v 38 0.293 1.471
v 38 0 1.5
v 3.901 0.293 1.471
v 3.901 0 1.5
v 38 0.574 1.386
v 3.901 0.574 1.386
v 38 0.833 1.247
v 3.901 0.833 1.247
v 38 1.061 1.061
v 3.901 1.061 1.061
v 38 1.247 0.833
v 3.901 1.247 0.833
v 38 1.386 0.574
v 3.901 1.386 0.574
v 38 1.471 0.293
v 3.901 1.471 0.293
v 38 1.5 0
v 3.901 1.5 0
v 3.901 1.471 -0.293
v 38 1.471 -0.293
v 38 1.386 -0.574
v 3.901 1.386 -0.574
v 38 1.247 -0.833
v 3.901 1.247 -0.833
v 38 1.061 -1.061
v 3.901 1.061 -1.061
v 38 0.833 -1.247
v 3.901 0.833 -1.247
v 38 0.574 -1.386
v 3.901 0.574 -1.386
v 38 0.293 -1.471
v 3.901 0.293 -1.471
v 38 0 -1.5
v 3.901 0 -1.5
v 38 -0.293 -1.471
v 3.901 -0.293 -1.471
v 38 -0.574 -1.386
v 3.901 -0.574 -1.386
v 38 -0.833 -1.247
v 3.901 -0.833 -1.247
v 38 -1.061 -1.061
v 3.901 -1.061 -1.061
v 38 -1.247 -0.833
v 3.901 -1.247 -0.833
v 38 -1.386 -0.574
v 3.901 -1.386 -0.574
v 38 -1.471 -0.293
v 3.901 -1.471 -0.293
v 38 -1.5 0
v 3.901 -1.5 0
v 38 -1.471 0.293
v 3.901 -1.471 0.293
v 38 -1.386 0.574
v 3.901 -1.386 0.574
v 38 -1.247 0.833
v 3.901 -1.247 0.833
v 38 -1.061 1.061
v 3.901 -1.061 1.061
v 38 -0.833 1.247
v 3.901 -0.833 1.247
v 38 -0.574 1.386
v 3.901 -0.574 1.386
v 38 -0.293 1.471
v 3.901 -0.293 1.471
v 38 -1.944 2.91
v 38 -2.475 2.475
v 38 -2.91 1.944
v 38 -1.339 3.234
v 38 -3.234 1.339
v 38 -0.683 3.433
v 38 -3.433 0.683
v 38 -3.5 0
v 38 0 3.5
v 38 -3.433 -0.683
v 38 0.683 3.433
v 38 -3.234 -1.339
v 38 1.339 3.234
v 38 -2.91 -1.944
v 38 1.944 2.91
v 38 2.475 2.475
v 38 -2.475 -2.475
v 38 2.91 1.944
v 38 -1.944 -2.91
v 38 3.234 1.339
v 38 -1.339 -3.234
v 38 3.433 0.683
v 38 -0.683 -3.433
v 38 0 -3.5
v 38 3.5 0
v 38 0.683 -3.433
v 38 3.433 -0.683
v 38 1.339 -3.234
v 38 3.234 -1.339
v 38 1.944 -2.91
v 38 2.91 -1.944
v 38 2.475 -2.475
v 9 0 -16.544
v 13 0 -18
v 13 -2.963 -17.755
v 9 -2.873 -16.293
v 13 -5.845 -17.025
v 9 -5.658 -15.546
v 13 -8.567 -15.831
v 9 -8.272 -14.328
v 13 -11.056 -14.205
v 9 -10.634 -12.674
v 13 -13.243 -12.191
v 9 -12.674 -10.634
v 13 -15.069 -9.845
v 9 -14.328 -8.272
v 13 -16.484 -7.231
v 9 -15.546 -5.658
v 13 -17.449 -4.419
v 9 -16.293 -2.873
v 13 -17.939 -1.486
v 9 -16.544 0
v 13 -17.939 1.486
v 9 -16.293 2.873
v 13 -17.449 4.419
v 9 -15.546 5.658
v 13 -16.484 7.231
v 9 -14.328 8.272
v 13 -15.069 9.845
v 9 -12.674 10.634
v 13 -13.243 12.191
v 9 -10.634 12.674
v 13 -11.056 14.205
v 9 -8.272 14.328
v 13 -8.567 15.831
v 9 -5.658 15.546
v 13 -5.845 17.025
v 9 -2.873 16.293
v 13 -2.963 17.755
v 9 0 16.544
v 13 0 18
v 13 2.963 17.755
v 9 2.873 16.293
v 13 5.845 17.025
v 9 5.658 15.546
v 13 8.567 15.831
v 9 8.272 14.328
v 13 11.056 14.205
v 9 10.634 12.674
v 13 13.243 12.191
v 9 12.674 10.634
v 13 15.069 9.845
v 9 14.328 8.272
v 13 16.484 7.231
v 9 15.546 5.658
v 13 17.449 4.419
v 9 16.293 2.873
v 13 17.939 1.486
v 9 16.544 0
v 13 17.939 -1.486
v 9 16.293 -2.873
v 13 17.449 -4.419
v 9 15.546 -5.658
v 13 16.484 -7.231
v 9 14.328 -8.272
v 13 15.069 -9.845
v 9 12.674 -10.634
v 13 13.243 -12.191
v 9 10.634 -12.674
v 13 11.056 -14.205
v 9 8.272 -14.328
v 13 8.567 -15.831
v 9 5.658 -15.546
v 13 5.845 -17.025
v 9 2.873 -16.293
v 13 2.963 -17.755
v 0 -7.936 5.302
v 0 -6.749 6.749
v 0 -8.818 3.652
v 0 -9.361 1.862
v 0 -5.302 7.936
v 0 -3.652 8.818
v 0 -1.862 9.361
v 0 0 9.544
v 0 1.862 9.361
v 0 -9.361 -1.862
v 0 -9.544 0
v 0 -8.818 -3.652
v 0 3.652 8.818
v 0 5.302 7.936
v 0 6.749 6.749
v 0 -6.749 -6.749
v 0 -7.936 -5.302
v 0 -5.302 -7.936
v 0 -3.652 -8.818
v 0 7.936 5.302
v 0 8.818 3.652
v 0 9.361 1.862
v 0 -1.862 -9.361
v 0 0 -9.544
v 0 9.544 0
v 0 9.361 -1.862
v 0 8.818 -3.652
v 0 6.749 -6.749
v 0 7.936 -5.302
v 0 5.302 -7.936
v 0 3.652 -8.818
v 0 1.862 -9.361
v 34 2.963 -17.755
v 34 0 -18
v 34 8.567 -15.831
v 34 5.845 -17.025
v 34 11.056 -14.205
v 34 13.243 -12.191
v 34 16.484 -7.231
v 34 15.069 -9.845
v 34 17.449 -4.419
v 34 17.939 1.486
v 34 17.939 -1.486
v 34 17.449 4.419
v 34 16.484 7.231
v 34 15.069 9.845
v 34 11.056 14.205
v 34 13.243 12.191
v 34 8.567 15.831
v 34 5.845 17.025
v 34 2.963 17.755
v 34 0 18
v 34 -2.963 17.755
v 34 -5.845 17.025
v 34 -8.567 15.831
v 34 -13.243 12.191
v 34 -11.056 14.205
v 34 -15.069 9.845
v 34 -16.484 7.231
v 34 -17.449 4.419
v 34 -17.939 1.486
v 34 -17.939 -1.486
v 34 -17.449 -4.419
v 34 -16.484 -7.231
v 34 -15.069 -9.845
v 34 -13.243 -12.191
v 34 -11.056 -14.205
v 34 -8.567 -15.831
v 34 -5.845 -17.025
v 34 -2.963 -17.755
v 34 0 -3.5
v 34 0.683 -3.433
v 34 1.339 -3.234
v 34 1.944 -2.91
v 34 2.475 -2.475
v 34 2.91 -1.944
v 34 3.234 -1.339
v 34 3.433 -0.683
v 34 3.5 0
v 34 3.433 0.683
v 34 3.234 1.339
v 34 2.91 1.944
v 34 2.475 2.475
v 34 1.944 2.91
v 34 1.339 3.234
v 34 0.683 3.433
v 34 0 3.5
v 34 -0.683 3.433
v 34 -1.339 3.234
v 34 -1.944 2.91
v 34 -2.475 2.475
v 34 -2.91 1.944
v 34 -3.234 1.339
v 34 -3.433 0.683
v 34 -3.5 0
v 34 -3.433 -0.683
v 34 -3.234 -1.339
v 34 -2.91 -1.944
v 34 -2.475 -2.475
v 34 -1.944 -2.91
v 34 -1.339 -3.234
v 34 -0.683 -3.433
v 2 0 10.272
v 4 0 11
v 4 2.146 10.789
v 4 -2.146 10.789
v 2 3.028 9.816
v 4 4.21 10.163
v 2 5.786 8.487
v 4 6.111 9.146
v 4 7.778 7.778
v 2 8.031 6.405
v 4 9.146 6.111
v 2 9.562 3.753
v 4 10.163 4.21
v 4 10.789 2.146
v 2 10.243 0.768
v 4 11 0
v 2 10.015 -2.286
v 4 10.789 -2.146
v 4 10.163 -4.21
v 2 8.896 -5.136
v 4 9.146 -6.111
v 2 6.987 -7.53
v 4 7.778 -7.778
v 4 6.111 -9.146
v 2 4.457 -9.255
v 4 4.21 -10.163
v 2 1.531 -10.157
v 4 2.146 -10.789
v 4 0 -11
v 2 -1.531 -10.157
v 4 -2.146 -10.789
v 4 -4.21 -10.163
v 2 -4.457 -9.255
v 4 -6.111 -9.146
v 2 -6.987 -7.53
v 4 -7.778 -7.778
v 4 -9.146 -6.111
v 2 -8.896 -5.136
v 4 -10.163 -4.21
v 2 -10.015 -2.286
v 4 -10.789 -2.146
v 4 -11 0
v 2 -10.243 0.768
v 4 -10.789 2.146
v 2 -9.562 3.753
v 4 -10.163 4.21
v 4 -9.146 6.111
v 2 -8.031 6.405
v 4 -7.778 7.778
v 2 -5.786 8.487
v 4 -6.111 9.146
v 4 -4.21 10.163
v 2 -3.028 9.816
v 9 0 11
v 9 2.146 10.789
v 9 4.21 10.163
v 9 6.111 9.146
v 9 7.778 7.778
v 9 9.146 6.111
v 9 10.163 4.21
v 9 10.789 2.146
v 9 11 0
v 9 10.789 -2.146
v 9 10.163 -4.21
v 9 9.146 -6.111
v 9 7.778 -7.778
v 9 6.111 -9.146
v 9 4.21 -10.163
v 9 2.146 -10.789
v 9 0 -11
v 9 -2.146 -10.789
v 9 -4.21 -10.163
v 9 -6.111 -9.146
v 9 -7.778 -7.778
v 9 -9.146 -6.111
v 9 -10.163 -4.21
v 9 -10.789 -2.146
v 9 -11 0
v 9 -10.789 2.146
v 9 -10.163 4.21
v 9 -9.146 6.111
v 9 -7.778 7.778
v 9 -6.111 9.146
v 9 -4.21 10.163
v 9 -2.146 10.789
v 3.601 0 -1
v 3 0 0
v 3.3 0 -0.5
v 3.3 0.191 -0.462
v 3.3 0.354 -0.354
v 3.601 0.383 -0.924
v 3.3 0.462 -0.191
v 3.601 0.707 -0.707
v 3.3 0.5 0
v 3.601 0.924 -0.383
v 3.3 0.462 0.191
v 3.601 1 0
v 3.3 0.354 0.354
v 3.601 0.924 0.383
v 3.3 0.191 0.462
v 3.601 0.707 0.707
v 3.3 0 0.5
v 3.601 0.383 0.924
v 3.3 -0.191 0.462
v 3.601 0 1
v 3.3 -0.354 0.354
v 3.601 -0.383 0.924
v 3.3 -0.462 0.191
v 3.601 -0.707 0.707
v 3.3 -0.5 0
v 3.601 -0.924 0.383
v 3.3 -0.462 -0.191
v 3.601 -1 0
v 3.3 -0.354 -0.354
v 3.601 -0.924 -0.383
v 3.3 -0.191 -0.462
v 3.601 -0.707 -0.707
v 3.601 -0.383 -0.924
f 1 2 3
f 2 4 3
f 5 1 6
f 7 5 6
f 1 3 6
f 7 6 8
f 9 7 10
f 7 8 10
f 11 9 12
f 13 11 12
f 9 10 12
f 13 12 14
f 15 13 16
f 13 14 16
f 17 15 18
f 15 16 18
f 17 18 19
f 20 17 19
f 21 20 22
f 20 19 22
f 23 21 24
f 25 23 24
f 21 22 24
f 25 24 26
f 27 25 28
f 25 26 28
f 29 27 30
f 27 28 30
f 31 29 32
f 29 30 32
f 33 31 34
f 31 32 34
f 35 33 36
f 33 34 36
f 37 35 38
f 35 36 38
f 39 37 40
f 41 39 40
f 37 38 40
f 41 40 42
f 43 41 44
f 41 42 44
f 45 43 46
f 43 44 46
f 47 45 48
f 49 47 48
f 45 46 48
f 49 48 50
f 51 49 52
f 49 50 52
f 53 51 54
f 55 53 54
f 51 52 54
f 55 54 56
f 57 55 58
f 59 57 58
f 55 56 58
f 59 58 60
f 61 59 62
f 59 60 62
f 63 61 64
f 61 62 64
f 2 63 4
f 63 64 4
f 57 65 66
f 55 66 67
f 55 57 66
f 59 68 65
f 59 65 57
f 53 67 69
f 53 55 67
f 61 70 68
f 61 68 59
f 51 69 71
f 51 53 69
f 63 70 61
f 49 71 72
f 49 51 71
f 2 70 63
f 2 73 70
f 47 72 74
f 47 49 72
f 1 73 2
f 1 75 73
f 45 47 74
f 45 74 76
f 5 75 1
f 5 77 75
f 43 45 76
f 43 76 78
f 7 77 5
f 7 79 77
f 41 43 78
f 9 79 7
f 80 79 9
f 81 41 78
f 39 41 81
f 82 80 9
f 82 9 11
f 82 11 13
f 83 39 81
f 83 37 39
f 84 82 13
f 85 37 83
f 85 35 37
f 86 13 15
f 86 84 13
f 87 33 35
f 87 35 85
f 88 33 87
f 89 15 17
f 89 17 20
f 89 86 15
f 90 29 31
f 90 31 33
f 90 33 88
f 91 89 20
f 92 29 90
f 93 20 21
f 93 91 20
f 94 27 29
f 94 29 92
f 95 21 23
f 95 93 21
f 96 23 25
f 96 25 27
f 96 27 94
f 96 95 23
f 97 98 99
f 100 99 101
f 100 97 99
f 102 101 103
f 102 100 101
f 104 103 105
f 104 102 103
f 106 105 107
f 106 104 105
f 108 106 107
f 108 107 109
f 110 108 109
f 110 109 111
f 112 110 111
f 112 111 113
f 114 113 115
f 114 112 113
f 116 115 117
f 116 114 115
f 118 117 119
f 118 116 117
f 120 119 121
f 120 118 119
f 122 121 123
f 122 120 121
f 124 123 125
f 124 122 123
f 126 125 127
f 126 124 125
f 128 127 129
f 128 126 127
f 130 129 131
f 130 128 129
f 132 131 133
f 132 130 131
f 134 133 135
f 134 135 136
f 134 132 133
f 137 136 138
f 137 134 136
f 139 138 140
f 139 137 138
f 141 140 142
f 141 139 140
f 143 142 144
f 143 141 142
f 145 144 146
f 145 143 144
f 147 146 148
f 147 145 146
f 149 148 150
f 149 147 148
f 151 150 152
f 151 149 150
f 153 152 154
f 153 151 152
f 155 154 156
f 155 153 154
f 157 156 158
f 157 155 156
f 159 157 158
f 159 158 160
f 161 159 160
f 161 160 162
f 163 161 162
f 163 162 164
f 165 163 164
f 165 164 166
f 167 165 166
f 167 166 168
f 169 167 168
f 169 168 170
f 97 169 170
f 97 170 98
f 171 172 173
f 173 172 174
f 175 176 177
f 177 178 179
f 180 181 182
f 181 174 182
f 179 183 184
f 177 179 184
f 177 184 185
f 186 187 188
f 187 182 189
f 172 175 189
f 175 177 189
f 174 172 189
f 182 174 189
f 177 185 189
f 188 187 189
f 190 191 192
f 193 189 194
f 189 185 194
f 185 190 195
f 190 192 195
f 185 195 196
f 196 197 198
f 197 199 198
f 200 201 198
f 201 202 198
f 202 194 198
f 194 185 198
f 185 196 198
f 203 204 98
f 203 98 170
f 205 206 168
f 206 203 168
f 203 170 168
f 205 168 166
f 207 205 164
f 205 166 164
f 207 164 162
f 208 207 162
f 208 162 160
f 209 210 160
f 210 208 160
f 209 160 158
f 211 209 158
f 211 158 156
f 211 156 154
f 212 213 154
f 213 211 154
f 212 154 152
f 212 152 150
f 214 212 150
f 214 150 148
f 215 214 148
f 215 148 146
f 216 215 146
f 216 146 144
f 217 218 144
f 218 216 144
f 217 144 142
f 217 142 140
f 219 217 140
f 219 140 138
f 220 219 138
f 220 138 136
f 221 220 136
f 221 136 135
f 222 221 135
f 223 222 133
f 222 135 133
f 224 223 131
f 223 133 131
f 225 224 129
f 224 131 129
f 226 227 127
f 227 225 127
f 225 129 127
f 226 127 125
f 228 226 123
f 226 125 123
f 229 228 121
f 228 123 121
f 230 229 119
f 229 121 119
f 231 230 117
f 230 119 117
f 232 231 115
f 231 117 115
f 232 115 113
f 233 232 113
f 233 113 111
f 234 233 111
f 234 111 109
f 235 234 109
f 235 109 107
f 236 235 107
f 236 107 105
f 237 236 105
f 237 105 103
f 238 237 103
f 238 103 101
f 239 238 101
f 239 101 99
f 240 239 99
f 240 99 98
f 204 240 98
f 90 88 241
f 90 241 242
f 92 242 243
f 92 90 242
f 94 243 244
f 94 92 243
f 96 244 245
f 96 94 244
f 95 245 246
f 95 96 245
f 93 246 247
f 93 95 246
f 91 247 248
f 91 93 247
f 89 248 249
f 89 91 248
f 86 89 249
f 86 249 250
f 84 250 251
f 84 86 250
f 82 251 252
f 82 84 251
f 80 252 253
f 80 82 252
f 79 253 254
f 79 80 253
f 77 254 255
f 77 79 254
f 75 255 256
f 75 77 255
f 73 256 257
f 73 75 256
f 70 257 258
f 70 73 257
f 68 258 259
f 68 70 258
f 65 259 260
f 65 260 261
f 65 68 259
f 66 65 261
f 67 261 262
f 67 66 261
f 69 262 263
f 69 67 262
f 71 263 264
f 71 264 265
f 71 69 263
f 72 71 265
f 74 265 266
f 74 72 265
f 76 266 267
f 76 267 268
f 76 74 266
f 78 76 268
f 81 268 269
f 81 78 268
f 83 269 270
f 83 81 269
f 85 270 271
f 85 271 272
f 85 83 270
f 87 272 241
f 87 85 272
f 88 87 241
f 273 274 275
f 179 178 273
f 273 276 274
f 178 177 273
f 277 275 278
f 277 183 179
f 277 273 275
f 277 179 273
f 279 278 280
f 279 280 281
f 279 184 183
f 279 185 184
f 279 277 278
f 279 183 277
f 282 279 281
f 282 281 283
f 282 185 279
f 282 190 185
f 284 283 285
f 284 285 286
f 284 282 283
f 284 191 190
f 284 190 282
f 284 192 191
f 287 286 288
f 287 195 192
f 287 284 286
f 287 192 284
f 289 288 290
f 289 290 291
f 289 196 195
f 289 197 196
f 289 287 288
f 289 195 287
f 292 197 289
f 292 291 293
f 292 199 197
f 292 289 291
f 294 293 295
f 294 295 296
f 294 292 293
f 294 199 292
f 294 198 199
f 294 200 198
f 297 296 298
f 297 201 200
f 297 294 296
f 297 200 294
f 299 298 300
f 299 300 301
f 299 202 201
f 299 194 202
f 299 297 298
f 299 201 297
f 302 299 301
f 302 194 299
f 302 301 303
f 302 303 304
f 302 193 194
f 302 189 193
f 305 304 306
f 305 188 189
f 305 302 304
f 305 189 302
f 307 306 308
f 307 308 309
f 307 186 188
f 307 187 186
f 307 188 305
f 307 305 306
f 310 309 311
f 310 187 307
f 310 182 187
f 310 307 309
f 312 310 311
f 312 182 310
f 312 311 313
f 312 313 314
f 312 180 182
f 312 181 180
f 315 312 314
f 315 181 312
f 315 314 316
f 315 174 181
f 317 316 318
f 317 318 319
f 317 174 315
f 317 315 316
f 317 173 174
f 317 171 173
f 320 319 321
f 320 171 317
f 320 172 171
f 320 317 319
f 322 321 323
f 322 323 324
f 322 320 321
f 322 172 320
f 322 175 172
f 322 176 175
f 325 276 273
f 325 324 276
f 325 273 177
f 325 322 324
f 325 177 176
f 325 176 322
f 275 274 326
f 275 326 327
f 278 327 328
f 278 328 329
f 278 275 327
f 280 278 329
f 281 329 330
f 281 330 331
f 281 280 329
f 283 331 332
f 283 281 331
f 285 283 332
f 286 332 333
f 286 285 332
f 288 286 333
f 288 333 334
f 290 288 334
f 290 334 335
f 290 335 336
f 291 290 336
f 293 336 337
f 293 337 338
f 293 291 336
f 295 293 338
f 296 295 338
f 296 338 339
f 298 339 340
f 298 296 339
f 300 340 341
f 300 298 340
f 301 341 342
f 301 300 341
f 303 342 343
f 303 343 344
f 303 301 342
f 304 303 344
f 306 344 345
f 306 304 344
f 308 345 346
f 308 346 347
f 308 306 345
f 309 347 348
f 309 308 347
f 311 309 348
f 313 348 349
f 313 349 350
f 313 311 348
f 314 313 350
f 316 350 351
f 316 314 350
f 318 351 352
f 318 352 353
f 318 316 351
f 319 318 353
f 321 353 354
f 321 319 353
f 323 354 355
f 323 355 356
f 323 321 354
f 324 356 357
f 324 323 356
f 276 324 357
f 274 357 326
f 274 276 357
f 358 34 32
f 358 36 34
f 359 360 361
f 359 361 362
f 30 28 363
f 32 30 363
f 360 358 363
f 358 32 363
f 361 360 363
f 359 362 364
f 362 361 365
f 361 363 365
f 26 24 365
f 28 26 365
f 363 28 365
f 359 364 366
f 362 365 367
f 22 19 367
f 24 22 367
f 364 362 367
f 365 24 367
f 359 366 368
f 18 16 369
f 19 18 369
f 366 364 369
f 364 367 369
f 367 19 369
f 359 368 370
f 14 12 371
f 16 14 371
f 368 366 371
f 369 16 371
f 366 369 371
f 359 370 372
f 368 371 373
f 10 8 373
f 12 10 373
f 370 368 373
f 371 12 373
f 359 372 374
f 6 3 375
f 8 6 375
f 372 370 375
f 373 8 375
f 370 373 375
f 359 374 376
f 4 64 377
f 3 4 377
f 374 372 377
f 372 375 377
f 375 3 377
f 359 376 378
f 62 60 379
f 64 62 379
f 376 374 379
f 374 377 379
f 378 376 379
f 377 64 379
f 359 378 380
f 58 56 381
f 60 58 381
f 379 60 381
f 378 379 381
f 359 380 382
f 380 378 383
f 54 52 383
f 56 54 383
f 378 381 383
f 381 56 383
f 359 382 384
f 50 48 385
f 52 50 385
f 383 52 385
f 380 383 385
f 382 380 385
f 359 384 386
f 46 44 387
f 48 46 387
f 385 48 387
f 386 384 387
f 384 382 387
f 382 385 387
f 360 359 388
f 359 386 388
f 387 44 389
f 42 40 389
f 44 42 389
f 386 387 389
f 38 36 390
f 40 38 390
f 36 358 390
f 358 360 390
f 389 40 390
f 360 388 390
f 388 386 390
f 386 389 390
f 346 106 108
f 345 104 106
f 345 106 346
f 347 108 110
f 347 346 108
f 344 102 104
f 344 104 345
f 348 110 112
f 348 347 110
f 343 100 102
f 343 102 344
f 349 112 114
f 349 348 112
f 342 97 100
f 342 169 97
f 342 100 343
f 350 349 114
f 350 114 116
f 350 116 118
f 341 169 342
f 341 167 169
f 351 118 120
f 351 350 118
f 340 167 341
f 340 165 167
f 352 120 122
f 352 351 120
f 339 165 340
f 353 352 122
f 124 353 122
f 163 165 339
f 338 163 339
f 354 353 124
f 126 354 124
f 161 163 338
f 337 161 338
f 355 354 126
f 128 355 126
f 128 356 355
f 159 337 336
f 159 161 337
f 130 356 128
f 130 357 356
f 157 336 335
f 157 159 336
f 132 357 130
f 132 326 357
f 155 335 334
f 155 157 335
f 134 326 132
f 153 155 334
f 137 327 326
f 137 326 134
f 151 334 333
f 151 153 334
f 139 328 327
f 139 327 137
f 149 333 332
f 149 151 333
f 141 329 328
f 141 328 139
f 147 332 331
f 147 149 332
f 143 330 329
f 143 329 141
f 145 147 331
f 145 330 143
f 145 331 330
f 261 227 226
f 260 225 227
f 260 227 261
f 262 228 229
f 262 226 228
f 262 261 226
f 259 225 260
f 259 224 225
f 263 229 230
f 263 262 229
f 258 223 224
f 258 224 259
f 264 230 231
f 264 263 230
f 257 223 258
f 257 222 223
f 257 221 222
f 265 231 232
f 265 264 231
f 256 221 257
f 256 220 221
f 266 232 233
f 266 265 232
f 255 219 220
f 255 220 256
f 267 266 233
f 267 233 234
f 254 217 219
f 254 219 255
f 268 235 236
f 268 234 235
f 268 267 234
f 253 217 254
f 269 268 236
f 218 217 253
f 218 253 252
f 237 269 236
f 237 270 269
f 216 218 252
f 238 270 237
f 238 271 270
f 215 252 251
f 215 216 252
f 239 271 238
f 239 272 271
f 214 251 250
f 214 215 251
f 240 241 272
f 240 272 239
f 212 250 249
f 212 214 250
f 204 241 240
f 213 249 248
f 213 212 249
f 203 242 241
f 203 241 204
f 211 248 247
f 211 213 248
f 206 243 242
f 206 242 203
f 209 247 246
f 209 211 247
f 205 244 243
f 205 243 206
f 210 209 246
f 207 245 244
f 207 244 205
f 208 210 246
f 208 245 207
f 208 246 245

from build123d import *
from OCP.BRepFilletAPI import BRepFilletAPI_MakeChamfer

# Parameters (mm, degrees)
SKETCH1_R                    = 18
BOSS_EXTRUDE1_DEPTH          = 38
SKETCH2_OUTSIDE_W            = 50.706
SKETCH2_OUTSIDE_H            = 50.706
SKETCH2_OUTSIDE_R            = 3.5
CUT_EXTRUDE1_DEPTH           = 4
SKETCH3_OUTSIDE_W            = 50.706
SKETCH3_OUTSIDE_H            = 50.706
SKETCH3_OUTSIDE_R            = 11
CUT_EXTRUDE2_DEPTH           = 9
CHAMFER1_SIZE                = 4
CHAMFER1_SIZE2               = 1.455880937
F_3_0_3_DIAMETER_HOLE1_D     = 3
F_3_0_3_DIAMETER_HOLE1_DEPTH = 34.098709071
F_3_0_3_DIAMETER_HOLE1_TIP   = 0.901290929


with BuildPart() as part:
    # Sketch1 → Boss-Extrude1 (new body)
    with BuildSketch(Plane(origin=(0, 0, 0), x_dir=(0, 0, -1), z_dir=(1, 0, 0))):
        Circle(SKETCH1_R)
    extrude(amount=BOSS_EXTRUDE1_DEPTH)

    # Sketch2 outside → Cut-Extrude1 (cut)
    with BuildSketch(Plane(origin=(38, 0, 0), x_dir=(0, 0, -1), z_dir=(1, 0, 0))):
        Rectangle(SKETCH2_OUTSIDE_W, SKETCH2_OUTSIDE_H)
        Circle(SKETCH2_OUTSIDE_R, mode=Mode.SUBTRACT)
    extrude(amount=-CUT_EXTRUDE1_DEPTH, mode=Mode.SUBTRACT)

    # Sketch3 outside → Cut-Extrude2 (cut)
    with BuildSketch(Plane.ZY):
        Rectangle(SKETCH3_OUTSIDE_W, SKETCH3_OUTSIDE_H)
        Circle(SKETCH3_OUTSIDE_R, mode=Mode.SUBTRACT)
    extrude(amount=-CUT_EXTRUDE2_DEPTH, mode=Mode.SUBTRACT)

    # Chamfer1: one chamfer whose edges measure the first distance from different faces: ONE call of the kernel's chamfer builder (chamfer() names one face for all edges)
    chamfer1_edges_1 = [part.edges().sort_by_distance(p)[0] for p in [
        (9, 0, 18),
    ]]
    chamfer1_side_1 = [part.faces().sort_by_distance(p)[0] for p in [
        (21.5, 0, 18),
    ]]
    chamfer1_edges_2 = [part.edges().sort_by_distance(p)[0] for p in [
        (0, 0, -11),
    ]]
    chamfer1_side_2 = [part.faces().sort_by_distance(p)[0] for p in [
        (4.5, 0, -11),
    ]]
    chamfer1 = BRepFilletAPI_MakeChamfer(part.part.solid().wrapped)
    for e in chamfer1_edges_1:
        chamfer1.Add(CHAMFER1_SIZE, CHAMFER1_SIZE2, e.wrapped, chamfer1_side_1[0].wrapped)  # the first distance lies on this face
    for e in chamfer1_edges_2:
        chamfer1.Add(CHAMFER1_SIZE, CHAMFER1_SIZE2, e.wrapped, chamfer1_side_2[0].wrapped)  # the first distance lies on this face
    add(Compound.cast(chamfer1.Shape()), mode=Mode.REPLACE)

    # Ø3.0 (3) Diameter Hole1
    with Locations(Plane(origin=(38, 0, 0), x_dir=(0, 0, -1), z_dir=(1, 0, 0))):
        with Locations((0, 0)):
            Hole(F_3_0_3_DIAMETER_HOLE1_D / 2, depth=F_3_0_3_DIAMETER_HOLE1_DEPTH)
            with Locations((0, 0, -(F_3_0_3_DIAMETER_HOLE1_DEPTH + F_3_0_3_DIAMETER_HOLE1_TIP / 2))):  # 118° drill point
                Cone(0, F_3_0_3_DIAMETER_HOLE1_D / 2, F_3_0_3_DIAMETER_HOLE1_TIP, mode=Mode.SUBTRACT)


solid = part.part
